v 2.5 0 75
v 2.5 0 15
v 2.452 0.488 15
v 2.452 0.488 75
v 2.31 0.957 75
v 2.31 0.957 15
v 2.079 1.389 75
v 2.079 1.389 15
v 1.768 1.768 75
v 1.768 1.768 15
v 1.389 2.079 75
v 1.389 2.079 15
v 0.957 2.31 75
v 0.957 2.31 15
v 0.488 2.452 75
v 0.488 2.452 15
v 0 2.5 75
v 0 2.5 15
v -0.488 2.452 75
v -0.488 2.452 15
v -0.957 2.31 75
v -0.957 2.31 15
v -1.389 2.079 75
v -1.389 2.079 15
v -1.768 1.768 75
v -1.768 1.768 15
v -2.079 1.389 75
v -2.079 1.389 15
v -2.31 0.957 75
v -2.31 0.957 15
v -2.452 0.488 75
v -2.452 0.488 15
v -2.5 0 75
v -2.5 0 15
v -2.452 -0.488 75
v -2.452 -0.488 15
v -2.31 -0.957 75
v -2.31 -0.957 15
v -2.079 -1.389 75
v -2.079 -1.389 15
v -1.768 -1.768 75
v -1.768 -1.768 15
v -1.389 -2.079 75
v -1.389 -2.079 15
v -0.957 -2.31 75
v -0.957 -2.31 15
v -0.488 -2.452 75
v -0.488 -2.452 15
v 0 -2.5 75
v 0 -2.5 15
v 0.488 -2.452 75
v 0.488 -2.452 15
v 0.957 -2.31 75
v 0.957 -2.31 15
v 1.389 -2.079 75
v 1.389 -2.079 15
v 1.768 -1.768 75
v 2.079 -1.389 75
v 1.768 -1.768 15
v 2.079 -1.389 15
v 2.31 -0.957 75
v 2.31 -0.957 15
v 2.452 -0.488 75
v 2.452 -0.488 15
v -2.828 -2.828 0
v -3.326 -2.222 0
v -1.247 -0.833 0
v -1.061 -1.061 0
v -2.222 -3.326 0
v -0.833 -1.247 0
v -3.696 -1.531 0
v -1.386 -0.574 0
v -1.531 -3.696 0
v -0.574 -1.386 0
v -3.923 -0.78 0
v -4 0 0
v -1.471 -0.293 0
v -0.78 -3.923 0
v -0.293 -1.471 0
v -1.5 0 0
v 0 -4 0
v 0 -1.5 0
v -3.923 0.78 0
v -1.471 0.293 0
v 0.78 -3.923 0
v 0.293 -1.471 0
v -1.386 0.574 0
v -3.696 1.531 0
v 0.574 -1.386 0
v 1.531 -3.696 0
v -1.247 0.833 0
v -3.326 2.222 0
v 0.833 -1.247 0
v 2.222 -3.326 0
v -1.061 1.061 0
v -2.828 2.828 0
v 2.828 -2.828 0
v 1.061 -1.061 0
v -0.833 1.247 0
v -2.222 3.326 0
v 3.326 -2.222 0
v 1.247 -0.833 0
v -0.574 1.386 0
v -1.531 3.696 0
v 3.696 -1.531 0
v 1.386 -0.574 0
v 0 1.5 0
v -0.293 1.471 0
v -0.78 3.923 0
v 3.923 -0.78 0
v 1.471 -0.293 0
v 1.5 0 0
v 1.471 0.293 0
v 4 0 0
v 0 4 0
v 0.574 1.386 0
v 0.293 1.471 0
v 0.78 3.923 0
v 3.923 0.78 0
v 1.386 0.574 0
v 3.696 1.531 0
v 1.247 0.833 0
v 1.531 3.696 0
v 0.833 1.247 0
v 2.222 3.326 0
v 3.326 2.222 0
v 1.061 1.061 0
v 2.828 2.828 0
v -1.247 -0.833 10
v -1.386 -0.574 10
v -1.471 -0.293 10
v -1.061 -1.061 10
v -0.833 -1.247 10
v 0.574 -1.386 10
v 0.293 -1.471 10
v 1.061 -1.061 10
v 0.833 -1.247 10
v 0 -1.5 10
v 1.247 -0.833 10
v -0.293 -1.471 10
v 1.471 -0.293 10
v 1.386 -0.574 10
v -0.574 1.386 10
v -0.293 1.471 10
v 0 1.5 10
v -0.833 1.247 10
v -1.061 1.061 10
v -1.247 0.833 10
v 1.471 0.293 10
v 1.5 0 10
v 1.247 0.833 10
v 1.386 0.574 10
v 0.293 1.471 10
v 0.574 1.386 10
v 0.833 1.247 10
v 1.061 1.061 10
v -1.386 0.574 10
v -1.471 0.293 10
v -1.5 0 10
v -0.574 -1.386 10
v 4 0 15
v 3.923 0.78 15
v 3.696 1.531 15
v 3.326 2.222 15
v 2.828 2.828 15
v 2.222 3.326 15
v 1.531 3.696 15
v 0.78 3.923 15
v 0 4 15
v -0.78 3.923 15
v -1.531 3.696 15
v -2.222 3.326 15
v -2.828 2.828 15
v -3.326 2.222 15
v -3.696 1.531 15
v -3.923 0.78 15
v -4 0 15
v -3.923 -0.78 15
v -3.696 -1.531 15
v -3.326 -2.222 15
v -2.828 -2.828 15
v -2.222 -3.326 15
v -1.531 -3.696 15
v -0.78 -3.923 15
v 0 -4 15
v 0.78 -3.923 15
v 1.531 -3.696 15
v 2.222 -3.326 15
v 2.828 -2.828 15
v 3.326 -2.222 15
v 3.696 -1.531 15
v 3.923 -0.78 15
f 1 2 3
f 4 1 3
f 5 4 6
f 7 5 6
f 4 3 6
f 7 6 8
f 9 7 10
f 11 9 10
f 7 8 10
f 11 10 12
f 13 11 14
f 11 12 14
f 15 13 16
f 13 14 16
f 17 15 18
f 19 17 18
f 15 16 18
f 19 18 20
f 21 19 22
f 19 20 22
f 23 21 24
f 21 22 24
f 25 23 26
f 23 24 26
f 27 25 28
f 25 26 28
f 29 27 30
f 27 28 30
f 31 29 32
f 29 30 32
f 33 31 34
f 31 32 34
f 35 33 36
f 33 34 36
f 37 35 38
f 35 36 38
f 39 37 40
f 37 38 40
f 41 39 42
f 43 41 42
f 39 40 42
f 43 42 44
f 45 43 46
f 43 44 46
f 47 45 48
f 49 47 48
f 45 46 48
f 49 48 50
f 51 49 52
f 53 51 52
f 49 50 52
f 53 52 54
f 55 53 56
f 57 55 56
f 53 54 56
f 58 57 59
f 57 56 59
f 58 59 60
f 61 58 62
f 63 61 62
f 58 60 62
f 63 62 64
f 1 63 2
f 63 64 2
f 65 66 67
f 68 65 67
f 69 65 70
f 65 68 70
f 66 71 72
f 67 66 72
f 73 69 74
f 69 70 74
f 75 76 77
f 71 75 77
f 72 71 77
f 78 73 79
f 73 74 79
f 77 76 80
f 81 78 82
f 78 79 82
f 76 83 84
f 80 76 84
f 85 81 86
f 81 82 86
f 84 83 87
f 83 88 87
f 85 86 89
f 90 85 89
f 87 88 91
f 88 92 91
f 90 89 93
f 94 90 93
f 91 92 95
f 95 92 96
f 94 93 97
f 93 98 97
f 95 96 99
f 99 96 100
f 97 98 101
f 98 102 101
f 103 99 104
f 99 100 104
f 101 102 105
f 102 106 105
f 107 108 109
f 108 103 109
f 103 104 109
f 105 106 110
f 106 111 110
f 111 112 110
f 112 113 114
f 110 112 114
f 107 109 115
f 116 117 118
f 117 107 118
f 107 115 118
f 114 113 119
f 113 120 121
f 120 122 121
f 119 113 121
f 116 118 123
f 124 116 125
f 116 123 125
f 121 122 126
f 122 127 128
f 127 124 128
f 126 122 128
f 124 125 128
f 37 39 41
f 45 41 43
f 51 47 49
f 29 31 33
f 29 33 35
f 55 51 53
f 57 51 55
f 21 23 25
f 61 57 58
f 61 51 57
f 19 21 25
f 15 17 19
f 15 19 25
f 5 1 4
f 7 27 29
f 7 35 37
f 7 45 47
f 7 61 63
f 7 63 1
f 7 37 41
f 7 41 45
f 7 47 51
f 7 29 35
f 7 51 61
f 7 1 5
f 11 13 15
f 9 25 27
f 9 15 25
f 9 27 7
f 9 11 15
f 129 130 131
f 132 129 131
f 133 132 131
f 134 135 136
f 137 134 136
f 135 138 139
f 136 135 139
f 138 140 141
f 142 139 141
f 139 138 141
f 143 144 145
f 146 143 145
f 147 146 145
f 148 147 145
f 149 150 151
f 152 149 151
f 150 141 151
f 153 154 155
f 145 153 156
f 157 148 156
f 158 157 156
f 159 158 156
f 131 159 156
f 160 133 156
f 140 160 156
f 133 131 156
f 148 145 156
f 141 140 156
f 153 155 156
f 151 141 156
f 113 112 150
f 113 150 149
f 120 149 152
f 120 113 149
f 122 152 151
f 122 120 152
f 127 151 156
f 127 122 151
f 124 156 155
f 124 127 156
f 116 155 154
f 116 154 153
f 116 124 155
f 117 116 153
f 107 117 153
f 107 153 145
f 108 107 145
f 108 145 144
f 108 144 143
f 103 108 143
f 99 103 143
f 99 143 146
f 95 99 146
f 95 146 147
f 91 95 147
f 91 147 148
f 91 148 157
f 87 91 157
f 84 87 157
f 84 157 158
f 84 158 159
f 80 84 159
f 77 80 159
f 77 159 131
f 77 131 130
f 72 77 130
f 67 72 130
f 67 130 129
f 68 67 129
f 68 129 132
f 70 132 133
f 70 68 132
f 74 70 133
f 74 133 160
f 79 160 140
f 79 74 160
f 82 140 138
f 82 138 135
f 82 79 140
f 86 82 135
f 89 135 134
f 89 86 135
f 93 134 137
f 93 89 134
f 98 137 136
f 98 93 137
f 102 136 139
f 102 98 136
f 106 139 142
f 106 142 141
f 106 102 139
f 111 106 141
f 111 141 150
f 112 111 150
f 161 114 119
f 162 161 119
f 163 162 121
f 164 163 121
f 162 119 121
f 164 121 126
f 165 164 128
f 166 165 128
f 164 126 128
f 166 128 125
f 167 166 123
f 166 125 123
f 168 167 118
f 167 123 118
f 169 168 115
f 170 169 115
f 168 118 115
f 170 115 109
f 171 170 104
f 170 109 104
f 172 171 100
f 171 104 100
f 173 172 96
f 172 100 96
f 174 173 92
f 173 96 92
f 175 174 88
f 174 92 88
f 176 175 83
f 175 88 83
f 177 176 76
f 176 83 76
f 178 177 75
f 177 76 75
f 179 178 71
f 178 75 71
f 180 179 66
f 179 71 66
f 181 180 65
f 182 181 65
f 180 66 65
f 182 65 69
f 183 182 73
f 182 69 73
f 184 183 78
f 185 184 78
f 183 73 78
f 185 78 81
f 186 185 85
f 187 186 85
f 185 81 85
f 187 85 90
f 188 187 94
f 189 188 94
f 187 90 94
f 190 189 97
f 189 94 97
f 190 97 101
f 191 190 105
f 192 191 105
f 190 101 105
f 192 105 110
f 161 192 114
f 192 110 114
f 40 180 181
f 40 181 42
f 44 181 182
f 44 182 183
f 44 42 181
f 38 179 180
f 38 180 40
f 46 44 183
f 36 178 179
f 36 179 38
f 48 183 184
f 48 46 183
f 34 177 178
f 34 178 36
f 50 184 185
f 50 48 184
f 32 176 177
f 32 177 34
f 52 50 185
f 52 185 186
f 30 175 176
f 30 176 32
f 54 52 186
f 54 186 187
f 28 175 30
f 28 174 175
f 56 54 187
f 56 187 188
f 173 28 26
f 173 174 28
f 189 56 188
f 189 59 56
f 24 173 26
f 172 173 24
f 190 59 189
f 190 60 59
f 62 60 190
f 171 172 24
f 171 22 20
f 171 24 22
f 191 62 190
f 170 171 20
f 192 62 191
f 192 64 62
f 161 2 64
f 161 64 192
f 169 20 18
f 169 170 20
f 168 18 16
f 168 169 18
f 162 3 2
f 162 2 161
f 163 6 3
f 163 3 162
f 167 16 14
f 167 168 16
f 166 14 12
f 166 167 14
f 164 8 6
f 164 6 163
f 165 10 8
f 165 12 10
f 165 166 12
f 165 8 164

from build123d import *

# Parameters (mm, degrees)
SKETCH1_R           = 4
SKETCH1_R_2         = 1.5
BOSS_EXTRUDE1_DEPTH = 15
BOSS_EXTRUDE2_START = -5
SKETCH2_R           = 1.5
BOSS_EXTRUDE2_DEPTH = 5
SKETCH3_R           = 2.5
BOSS_EXTRUDE3_DEPTH = 60


with BuildPart() as part:
    # Sketch1 → Boss-Extrude1 (new body)
    with BuildSketch(Plane.XY):
        Circle(SKETCH1_R)
        Circle(SKETCH1_R_2, mode=Mode.SUBTRACT)
    extrude(amount=BOSS_EXTRUDE1_DEPTH)

    # Sketch2 → Boss-Extrude2 (add)
    with BuildSketch(Plane.XY.offset(15).offset(BOSS_EXTRUDE2_START)):
        Circle(SKETCH2_R)
    extrude(amount=BOSS_EXTRUDE2_DEPTH)

    # Sketch3 → Boss-Extrude3 (add)
    with BuildSketch(Plane.XY.offset(15)):
        Circle(SKETCH3_R)
    extrude(amount=BOSS_EXTRUDE3_DEPTH)


solid = part.part
